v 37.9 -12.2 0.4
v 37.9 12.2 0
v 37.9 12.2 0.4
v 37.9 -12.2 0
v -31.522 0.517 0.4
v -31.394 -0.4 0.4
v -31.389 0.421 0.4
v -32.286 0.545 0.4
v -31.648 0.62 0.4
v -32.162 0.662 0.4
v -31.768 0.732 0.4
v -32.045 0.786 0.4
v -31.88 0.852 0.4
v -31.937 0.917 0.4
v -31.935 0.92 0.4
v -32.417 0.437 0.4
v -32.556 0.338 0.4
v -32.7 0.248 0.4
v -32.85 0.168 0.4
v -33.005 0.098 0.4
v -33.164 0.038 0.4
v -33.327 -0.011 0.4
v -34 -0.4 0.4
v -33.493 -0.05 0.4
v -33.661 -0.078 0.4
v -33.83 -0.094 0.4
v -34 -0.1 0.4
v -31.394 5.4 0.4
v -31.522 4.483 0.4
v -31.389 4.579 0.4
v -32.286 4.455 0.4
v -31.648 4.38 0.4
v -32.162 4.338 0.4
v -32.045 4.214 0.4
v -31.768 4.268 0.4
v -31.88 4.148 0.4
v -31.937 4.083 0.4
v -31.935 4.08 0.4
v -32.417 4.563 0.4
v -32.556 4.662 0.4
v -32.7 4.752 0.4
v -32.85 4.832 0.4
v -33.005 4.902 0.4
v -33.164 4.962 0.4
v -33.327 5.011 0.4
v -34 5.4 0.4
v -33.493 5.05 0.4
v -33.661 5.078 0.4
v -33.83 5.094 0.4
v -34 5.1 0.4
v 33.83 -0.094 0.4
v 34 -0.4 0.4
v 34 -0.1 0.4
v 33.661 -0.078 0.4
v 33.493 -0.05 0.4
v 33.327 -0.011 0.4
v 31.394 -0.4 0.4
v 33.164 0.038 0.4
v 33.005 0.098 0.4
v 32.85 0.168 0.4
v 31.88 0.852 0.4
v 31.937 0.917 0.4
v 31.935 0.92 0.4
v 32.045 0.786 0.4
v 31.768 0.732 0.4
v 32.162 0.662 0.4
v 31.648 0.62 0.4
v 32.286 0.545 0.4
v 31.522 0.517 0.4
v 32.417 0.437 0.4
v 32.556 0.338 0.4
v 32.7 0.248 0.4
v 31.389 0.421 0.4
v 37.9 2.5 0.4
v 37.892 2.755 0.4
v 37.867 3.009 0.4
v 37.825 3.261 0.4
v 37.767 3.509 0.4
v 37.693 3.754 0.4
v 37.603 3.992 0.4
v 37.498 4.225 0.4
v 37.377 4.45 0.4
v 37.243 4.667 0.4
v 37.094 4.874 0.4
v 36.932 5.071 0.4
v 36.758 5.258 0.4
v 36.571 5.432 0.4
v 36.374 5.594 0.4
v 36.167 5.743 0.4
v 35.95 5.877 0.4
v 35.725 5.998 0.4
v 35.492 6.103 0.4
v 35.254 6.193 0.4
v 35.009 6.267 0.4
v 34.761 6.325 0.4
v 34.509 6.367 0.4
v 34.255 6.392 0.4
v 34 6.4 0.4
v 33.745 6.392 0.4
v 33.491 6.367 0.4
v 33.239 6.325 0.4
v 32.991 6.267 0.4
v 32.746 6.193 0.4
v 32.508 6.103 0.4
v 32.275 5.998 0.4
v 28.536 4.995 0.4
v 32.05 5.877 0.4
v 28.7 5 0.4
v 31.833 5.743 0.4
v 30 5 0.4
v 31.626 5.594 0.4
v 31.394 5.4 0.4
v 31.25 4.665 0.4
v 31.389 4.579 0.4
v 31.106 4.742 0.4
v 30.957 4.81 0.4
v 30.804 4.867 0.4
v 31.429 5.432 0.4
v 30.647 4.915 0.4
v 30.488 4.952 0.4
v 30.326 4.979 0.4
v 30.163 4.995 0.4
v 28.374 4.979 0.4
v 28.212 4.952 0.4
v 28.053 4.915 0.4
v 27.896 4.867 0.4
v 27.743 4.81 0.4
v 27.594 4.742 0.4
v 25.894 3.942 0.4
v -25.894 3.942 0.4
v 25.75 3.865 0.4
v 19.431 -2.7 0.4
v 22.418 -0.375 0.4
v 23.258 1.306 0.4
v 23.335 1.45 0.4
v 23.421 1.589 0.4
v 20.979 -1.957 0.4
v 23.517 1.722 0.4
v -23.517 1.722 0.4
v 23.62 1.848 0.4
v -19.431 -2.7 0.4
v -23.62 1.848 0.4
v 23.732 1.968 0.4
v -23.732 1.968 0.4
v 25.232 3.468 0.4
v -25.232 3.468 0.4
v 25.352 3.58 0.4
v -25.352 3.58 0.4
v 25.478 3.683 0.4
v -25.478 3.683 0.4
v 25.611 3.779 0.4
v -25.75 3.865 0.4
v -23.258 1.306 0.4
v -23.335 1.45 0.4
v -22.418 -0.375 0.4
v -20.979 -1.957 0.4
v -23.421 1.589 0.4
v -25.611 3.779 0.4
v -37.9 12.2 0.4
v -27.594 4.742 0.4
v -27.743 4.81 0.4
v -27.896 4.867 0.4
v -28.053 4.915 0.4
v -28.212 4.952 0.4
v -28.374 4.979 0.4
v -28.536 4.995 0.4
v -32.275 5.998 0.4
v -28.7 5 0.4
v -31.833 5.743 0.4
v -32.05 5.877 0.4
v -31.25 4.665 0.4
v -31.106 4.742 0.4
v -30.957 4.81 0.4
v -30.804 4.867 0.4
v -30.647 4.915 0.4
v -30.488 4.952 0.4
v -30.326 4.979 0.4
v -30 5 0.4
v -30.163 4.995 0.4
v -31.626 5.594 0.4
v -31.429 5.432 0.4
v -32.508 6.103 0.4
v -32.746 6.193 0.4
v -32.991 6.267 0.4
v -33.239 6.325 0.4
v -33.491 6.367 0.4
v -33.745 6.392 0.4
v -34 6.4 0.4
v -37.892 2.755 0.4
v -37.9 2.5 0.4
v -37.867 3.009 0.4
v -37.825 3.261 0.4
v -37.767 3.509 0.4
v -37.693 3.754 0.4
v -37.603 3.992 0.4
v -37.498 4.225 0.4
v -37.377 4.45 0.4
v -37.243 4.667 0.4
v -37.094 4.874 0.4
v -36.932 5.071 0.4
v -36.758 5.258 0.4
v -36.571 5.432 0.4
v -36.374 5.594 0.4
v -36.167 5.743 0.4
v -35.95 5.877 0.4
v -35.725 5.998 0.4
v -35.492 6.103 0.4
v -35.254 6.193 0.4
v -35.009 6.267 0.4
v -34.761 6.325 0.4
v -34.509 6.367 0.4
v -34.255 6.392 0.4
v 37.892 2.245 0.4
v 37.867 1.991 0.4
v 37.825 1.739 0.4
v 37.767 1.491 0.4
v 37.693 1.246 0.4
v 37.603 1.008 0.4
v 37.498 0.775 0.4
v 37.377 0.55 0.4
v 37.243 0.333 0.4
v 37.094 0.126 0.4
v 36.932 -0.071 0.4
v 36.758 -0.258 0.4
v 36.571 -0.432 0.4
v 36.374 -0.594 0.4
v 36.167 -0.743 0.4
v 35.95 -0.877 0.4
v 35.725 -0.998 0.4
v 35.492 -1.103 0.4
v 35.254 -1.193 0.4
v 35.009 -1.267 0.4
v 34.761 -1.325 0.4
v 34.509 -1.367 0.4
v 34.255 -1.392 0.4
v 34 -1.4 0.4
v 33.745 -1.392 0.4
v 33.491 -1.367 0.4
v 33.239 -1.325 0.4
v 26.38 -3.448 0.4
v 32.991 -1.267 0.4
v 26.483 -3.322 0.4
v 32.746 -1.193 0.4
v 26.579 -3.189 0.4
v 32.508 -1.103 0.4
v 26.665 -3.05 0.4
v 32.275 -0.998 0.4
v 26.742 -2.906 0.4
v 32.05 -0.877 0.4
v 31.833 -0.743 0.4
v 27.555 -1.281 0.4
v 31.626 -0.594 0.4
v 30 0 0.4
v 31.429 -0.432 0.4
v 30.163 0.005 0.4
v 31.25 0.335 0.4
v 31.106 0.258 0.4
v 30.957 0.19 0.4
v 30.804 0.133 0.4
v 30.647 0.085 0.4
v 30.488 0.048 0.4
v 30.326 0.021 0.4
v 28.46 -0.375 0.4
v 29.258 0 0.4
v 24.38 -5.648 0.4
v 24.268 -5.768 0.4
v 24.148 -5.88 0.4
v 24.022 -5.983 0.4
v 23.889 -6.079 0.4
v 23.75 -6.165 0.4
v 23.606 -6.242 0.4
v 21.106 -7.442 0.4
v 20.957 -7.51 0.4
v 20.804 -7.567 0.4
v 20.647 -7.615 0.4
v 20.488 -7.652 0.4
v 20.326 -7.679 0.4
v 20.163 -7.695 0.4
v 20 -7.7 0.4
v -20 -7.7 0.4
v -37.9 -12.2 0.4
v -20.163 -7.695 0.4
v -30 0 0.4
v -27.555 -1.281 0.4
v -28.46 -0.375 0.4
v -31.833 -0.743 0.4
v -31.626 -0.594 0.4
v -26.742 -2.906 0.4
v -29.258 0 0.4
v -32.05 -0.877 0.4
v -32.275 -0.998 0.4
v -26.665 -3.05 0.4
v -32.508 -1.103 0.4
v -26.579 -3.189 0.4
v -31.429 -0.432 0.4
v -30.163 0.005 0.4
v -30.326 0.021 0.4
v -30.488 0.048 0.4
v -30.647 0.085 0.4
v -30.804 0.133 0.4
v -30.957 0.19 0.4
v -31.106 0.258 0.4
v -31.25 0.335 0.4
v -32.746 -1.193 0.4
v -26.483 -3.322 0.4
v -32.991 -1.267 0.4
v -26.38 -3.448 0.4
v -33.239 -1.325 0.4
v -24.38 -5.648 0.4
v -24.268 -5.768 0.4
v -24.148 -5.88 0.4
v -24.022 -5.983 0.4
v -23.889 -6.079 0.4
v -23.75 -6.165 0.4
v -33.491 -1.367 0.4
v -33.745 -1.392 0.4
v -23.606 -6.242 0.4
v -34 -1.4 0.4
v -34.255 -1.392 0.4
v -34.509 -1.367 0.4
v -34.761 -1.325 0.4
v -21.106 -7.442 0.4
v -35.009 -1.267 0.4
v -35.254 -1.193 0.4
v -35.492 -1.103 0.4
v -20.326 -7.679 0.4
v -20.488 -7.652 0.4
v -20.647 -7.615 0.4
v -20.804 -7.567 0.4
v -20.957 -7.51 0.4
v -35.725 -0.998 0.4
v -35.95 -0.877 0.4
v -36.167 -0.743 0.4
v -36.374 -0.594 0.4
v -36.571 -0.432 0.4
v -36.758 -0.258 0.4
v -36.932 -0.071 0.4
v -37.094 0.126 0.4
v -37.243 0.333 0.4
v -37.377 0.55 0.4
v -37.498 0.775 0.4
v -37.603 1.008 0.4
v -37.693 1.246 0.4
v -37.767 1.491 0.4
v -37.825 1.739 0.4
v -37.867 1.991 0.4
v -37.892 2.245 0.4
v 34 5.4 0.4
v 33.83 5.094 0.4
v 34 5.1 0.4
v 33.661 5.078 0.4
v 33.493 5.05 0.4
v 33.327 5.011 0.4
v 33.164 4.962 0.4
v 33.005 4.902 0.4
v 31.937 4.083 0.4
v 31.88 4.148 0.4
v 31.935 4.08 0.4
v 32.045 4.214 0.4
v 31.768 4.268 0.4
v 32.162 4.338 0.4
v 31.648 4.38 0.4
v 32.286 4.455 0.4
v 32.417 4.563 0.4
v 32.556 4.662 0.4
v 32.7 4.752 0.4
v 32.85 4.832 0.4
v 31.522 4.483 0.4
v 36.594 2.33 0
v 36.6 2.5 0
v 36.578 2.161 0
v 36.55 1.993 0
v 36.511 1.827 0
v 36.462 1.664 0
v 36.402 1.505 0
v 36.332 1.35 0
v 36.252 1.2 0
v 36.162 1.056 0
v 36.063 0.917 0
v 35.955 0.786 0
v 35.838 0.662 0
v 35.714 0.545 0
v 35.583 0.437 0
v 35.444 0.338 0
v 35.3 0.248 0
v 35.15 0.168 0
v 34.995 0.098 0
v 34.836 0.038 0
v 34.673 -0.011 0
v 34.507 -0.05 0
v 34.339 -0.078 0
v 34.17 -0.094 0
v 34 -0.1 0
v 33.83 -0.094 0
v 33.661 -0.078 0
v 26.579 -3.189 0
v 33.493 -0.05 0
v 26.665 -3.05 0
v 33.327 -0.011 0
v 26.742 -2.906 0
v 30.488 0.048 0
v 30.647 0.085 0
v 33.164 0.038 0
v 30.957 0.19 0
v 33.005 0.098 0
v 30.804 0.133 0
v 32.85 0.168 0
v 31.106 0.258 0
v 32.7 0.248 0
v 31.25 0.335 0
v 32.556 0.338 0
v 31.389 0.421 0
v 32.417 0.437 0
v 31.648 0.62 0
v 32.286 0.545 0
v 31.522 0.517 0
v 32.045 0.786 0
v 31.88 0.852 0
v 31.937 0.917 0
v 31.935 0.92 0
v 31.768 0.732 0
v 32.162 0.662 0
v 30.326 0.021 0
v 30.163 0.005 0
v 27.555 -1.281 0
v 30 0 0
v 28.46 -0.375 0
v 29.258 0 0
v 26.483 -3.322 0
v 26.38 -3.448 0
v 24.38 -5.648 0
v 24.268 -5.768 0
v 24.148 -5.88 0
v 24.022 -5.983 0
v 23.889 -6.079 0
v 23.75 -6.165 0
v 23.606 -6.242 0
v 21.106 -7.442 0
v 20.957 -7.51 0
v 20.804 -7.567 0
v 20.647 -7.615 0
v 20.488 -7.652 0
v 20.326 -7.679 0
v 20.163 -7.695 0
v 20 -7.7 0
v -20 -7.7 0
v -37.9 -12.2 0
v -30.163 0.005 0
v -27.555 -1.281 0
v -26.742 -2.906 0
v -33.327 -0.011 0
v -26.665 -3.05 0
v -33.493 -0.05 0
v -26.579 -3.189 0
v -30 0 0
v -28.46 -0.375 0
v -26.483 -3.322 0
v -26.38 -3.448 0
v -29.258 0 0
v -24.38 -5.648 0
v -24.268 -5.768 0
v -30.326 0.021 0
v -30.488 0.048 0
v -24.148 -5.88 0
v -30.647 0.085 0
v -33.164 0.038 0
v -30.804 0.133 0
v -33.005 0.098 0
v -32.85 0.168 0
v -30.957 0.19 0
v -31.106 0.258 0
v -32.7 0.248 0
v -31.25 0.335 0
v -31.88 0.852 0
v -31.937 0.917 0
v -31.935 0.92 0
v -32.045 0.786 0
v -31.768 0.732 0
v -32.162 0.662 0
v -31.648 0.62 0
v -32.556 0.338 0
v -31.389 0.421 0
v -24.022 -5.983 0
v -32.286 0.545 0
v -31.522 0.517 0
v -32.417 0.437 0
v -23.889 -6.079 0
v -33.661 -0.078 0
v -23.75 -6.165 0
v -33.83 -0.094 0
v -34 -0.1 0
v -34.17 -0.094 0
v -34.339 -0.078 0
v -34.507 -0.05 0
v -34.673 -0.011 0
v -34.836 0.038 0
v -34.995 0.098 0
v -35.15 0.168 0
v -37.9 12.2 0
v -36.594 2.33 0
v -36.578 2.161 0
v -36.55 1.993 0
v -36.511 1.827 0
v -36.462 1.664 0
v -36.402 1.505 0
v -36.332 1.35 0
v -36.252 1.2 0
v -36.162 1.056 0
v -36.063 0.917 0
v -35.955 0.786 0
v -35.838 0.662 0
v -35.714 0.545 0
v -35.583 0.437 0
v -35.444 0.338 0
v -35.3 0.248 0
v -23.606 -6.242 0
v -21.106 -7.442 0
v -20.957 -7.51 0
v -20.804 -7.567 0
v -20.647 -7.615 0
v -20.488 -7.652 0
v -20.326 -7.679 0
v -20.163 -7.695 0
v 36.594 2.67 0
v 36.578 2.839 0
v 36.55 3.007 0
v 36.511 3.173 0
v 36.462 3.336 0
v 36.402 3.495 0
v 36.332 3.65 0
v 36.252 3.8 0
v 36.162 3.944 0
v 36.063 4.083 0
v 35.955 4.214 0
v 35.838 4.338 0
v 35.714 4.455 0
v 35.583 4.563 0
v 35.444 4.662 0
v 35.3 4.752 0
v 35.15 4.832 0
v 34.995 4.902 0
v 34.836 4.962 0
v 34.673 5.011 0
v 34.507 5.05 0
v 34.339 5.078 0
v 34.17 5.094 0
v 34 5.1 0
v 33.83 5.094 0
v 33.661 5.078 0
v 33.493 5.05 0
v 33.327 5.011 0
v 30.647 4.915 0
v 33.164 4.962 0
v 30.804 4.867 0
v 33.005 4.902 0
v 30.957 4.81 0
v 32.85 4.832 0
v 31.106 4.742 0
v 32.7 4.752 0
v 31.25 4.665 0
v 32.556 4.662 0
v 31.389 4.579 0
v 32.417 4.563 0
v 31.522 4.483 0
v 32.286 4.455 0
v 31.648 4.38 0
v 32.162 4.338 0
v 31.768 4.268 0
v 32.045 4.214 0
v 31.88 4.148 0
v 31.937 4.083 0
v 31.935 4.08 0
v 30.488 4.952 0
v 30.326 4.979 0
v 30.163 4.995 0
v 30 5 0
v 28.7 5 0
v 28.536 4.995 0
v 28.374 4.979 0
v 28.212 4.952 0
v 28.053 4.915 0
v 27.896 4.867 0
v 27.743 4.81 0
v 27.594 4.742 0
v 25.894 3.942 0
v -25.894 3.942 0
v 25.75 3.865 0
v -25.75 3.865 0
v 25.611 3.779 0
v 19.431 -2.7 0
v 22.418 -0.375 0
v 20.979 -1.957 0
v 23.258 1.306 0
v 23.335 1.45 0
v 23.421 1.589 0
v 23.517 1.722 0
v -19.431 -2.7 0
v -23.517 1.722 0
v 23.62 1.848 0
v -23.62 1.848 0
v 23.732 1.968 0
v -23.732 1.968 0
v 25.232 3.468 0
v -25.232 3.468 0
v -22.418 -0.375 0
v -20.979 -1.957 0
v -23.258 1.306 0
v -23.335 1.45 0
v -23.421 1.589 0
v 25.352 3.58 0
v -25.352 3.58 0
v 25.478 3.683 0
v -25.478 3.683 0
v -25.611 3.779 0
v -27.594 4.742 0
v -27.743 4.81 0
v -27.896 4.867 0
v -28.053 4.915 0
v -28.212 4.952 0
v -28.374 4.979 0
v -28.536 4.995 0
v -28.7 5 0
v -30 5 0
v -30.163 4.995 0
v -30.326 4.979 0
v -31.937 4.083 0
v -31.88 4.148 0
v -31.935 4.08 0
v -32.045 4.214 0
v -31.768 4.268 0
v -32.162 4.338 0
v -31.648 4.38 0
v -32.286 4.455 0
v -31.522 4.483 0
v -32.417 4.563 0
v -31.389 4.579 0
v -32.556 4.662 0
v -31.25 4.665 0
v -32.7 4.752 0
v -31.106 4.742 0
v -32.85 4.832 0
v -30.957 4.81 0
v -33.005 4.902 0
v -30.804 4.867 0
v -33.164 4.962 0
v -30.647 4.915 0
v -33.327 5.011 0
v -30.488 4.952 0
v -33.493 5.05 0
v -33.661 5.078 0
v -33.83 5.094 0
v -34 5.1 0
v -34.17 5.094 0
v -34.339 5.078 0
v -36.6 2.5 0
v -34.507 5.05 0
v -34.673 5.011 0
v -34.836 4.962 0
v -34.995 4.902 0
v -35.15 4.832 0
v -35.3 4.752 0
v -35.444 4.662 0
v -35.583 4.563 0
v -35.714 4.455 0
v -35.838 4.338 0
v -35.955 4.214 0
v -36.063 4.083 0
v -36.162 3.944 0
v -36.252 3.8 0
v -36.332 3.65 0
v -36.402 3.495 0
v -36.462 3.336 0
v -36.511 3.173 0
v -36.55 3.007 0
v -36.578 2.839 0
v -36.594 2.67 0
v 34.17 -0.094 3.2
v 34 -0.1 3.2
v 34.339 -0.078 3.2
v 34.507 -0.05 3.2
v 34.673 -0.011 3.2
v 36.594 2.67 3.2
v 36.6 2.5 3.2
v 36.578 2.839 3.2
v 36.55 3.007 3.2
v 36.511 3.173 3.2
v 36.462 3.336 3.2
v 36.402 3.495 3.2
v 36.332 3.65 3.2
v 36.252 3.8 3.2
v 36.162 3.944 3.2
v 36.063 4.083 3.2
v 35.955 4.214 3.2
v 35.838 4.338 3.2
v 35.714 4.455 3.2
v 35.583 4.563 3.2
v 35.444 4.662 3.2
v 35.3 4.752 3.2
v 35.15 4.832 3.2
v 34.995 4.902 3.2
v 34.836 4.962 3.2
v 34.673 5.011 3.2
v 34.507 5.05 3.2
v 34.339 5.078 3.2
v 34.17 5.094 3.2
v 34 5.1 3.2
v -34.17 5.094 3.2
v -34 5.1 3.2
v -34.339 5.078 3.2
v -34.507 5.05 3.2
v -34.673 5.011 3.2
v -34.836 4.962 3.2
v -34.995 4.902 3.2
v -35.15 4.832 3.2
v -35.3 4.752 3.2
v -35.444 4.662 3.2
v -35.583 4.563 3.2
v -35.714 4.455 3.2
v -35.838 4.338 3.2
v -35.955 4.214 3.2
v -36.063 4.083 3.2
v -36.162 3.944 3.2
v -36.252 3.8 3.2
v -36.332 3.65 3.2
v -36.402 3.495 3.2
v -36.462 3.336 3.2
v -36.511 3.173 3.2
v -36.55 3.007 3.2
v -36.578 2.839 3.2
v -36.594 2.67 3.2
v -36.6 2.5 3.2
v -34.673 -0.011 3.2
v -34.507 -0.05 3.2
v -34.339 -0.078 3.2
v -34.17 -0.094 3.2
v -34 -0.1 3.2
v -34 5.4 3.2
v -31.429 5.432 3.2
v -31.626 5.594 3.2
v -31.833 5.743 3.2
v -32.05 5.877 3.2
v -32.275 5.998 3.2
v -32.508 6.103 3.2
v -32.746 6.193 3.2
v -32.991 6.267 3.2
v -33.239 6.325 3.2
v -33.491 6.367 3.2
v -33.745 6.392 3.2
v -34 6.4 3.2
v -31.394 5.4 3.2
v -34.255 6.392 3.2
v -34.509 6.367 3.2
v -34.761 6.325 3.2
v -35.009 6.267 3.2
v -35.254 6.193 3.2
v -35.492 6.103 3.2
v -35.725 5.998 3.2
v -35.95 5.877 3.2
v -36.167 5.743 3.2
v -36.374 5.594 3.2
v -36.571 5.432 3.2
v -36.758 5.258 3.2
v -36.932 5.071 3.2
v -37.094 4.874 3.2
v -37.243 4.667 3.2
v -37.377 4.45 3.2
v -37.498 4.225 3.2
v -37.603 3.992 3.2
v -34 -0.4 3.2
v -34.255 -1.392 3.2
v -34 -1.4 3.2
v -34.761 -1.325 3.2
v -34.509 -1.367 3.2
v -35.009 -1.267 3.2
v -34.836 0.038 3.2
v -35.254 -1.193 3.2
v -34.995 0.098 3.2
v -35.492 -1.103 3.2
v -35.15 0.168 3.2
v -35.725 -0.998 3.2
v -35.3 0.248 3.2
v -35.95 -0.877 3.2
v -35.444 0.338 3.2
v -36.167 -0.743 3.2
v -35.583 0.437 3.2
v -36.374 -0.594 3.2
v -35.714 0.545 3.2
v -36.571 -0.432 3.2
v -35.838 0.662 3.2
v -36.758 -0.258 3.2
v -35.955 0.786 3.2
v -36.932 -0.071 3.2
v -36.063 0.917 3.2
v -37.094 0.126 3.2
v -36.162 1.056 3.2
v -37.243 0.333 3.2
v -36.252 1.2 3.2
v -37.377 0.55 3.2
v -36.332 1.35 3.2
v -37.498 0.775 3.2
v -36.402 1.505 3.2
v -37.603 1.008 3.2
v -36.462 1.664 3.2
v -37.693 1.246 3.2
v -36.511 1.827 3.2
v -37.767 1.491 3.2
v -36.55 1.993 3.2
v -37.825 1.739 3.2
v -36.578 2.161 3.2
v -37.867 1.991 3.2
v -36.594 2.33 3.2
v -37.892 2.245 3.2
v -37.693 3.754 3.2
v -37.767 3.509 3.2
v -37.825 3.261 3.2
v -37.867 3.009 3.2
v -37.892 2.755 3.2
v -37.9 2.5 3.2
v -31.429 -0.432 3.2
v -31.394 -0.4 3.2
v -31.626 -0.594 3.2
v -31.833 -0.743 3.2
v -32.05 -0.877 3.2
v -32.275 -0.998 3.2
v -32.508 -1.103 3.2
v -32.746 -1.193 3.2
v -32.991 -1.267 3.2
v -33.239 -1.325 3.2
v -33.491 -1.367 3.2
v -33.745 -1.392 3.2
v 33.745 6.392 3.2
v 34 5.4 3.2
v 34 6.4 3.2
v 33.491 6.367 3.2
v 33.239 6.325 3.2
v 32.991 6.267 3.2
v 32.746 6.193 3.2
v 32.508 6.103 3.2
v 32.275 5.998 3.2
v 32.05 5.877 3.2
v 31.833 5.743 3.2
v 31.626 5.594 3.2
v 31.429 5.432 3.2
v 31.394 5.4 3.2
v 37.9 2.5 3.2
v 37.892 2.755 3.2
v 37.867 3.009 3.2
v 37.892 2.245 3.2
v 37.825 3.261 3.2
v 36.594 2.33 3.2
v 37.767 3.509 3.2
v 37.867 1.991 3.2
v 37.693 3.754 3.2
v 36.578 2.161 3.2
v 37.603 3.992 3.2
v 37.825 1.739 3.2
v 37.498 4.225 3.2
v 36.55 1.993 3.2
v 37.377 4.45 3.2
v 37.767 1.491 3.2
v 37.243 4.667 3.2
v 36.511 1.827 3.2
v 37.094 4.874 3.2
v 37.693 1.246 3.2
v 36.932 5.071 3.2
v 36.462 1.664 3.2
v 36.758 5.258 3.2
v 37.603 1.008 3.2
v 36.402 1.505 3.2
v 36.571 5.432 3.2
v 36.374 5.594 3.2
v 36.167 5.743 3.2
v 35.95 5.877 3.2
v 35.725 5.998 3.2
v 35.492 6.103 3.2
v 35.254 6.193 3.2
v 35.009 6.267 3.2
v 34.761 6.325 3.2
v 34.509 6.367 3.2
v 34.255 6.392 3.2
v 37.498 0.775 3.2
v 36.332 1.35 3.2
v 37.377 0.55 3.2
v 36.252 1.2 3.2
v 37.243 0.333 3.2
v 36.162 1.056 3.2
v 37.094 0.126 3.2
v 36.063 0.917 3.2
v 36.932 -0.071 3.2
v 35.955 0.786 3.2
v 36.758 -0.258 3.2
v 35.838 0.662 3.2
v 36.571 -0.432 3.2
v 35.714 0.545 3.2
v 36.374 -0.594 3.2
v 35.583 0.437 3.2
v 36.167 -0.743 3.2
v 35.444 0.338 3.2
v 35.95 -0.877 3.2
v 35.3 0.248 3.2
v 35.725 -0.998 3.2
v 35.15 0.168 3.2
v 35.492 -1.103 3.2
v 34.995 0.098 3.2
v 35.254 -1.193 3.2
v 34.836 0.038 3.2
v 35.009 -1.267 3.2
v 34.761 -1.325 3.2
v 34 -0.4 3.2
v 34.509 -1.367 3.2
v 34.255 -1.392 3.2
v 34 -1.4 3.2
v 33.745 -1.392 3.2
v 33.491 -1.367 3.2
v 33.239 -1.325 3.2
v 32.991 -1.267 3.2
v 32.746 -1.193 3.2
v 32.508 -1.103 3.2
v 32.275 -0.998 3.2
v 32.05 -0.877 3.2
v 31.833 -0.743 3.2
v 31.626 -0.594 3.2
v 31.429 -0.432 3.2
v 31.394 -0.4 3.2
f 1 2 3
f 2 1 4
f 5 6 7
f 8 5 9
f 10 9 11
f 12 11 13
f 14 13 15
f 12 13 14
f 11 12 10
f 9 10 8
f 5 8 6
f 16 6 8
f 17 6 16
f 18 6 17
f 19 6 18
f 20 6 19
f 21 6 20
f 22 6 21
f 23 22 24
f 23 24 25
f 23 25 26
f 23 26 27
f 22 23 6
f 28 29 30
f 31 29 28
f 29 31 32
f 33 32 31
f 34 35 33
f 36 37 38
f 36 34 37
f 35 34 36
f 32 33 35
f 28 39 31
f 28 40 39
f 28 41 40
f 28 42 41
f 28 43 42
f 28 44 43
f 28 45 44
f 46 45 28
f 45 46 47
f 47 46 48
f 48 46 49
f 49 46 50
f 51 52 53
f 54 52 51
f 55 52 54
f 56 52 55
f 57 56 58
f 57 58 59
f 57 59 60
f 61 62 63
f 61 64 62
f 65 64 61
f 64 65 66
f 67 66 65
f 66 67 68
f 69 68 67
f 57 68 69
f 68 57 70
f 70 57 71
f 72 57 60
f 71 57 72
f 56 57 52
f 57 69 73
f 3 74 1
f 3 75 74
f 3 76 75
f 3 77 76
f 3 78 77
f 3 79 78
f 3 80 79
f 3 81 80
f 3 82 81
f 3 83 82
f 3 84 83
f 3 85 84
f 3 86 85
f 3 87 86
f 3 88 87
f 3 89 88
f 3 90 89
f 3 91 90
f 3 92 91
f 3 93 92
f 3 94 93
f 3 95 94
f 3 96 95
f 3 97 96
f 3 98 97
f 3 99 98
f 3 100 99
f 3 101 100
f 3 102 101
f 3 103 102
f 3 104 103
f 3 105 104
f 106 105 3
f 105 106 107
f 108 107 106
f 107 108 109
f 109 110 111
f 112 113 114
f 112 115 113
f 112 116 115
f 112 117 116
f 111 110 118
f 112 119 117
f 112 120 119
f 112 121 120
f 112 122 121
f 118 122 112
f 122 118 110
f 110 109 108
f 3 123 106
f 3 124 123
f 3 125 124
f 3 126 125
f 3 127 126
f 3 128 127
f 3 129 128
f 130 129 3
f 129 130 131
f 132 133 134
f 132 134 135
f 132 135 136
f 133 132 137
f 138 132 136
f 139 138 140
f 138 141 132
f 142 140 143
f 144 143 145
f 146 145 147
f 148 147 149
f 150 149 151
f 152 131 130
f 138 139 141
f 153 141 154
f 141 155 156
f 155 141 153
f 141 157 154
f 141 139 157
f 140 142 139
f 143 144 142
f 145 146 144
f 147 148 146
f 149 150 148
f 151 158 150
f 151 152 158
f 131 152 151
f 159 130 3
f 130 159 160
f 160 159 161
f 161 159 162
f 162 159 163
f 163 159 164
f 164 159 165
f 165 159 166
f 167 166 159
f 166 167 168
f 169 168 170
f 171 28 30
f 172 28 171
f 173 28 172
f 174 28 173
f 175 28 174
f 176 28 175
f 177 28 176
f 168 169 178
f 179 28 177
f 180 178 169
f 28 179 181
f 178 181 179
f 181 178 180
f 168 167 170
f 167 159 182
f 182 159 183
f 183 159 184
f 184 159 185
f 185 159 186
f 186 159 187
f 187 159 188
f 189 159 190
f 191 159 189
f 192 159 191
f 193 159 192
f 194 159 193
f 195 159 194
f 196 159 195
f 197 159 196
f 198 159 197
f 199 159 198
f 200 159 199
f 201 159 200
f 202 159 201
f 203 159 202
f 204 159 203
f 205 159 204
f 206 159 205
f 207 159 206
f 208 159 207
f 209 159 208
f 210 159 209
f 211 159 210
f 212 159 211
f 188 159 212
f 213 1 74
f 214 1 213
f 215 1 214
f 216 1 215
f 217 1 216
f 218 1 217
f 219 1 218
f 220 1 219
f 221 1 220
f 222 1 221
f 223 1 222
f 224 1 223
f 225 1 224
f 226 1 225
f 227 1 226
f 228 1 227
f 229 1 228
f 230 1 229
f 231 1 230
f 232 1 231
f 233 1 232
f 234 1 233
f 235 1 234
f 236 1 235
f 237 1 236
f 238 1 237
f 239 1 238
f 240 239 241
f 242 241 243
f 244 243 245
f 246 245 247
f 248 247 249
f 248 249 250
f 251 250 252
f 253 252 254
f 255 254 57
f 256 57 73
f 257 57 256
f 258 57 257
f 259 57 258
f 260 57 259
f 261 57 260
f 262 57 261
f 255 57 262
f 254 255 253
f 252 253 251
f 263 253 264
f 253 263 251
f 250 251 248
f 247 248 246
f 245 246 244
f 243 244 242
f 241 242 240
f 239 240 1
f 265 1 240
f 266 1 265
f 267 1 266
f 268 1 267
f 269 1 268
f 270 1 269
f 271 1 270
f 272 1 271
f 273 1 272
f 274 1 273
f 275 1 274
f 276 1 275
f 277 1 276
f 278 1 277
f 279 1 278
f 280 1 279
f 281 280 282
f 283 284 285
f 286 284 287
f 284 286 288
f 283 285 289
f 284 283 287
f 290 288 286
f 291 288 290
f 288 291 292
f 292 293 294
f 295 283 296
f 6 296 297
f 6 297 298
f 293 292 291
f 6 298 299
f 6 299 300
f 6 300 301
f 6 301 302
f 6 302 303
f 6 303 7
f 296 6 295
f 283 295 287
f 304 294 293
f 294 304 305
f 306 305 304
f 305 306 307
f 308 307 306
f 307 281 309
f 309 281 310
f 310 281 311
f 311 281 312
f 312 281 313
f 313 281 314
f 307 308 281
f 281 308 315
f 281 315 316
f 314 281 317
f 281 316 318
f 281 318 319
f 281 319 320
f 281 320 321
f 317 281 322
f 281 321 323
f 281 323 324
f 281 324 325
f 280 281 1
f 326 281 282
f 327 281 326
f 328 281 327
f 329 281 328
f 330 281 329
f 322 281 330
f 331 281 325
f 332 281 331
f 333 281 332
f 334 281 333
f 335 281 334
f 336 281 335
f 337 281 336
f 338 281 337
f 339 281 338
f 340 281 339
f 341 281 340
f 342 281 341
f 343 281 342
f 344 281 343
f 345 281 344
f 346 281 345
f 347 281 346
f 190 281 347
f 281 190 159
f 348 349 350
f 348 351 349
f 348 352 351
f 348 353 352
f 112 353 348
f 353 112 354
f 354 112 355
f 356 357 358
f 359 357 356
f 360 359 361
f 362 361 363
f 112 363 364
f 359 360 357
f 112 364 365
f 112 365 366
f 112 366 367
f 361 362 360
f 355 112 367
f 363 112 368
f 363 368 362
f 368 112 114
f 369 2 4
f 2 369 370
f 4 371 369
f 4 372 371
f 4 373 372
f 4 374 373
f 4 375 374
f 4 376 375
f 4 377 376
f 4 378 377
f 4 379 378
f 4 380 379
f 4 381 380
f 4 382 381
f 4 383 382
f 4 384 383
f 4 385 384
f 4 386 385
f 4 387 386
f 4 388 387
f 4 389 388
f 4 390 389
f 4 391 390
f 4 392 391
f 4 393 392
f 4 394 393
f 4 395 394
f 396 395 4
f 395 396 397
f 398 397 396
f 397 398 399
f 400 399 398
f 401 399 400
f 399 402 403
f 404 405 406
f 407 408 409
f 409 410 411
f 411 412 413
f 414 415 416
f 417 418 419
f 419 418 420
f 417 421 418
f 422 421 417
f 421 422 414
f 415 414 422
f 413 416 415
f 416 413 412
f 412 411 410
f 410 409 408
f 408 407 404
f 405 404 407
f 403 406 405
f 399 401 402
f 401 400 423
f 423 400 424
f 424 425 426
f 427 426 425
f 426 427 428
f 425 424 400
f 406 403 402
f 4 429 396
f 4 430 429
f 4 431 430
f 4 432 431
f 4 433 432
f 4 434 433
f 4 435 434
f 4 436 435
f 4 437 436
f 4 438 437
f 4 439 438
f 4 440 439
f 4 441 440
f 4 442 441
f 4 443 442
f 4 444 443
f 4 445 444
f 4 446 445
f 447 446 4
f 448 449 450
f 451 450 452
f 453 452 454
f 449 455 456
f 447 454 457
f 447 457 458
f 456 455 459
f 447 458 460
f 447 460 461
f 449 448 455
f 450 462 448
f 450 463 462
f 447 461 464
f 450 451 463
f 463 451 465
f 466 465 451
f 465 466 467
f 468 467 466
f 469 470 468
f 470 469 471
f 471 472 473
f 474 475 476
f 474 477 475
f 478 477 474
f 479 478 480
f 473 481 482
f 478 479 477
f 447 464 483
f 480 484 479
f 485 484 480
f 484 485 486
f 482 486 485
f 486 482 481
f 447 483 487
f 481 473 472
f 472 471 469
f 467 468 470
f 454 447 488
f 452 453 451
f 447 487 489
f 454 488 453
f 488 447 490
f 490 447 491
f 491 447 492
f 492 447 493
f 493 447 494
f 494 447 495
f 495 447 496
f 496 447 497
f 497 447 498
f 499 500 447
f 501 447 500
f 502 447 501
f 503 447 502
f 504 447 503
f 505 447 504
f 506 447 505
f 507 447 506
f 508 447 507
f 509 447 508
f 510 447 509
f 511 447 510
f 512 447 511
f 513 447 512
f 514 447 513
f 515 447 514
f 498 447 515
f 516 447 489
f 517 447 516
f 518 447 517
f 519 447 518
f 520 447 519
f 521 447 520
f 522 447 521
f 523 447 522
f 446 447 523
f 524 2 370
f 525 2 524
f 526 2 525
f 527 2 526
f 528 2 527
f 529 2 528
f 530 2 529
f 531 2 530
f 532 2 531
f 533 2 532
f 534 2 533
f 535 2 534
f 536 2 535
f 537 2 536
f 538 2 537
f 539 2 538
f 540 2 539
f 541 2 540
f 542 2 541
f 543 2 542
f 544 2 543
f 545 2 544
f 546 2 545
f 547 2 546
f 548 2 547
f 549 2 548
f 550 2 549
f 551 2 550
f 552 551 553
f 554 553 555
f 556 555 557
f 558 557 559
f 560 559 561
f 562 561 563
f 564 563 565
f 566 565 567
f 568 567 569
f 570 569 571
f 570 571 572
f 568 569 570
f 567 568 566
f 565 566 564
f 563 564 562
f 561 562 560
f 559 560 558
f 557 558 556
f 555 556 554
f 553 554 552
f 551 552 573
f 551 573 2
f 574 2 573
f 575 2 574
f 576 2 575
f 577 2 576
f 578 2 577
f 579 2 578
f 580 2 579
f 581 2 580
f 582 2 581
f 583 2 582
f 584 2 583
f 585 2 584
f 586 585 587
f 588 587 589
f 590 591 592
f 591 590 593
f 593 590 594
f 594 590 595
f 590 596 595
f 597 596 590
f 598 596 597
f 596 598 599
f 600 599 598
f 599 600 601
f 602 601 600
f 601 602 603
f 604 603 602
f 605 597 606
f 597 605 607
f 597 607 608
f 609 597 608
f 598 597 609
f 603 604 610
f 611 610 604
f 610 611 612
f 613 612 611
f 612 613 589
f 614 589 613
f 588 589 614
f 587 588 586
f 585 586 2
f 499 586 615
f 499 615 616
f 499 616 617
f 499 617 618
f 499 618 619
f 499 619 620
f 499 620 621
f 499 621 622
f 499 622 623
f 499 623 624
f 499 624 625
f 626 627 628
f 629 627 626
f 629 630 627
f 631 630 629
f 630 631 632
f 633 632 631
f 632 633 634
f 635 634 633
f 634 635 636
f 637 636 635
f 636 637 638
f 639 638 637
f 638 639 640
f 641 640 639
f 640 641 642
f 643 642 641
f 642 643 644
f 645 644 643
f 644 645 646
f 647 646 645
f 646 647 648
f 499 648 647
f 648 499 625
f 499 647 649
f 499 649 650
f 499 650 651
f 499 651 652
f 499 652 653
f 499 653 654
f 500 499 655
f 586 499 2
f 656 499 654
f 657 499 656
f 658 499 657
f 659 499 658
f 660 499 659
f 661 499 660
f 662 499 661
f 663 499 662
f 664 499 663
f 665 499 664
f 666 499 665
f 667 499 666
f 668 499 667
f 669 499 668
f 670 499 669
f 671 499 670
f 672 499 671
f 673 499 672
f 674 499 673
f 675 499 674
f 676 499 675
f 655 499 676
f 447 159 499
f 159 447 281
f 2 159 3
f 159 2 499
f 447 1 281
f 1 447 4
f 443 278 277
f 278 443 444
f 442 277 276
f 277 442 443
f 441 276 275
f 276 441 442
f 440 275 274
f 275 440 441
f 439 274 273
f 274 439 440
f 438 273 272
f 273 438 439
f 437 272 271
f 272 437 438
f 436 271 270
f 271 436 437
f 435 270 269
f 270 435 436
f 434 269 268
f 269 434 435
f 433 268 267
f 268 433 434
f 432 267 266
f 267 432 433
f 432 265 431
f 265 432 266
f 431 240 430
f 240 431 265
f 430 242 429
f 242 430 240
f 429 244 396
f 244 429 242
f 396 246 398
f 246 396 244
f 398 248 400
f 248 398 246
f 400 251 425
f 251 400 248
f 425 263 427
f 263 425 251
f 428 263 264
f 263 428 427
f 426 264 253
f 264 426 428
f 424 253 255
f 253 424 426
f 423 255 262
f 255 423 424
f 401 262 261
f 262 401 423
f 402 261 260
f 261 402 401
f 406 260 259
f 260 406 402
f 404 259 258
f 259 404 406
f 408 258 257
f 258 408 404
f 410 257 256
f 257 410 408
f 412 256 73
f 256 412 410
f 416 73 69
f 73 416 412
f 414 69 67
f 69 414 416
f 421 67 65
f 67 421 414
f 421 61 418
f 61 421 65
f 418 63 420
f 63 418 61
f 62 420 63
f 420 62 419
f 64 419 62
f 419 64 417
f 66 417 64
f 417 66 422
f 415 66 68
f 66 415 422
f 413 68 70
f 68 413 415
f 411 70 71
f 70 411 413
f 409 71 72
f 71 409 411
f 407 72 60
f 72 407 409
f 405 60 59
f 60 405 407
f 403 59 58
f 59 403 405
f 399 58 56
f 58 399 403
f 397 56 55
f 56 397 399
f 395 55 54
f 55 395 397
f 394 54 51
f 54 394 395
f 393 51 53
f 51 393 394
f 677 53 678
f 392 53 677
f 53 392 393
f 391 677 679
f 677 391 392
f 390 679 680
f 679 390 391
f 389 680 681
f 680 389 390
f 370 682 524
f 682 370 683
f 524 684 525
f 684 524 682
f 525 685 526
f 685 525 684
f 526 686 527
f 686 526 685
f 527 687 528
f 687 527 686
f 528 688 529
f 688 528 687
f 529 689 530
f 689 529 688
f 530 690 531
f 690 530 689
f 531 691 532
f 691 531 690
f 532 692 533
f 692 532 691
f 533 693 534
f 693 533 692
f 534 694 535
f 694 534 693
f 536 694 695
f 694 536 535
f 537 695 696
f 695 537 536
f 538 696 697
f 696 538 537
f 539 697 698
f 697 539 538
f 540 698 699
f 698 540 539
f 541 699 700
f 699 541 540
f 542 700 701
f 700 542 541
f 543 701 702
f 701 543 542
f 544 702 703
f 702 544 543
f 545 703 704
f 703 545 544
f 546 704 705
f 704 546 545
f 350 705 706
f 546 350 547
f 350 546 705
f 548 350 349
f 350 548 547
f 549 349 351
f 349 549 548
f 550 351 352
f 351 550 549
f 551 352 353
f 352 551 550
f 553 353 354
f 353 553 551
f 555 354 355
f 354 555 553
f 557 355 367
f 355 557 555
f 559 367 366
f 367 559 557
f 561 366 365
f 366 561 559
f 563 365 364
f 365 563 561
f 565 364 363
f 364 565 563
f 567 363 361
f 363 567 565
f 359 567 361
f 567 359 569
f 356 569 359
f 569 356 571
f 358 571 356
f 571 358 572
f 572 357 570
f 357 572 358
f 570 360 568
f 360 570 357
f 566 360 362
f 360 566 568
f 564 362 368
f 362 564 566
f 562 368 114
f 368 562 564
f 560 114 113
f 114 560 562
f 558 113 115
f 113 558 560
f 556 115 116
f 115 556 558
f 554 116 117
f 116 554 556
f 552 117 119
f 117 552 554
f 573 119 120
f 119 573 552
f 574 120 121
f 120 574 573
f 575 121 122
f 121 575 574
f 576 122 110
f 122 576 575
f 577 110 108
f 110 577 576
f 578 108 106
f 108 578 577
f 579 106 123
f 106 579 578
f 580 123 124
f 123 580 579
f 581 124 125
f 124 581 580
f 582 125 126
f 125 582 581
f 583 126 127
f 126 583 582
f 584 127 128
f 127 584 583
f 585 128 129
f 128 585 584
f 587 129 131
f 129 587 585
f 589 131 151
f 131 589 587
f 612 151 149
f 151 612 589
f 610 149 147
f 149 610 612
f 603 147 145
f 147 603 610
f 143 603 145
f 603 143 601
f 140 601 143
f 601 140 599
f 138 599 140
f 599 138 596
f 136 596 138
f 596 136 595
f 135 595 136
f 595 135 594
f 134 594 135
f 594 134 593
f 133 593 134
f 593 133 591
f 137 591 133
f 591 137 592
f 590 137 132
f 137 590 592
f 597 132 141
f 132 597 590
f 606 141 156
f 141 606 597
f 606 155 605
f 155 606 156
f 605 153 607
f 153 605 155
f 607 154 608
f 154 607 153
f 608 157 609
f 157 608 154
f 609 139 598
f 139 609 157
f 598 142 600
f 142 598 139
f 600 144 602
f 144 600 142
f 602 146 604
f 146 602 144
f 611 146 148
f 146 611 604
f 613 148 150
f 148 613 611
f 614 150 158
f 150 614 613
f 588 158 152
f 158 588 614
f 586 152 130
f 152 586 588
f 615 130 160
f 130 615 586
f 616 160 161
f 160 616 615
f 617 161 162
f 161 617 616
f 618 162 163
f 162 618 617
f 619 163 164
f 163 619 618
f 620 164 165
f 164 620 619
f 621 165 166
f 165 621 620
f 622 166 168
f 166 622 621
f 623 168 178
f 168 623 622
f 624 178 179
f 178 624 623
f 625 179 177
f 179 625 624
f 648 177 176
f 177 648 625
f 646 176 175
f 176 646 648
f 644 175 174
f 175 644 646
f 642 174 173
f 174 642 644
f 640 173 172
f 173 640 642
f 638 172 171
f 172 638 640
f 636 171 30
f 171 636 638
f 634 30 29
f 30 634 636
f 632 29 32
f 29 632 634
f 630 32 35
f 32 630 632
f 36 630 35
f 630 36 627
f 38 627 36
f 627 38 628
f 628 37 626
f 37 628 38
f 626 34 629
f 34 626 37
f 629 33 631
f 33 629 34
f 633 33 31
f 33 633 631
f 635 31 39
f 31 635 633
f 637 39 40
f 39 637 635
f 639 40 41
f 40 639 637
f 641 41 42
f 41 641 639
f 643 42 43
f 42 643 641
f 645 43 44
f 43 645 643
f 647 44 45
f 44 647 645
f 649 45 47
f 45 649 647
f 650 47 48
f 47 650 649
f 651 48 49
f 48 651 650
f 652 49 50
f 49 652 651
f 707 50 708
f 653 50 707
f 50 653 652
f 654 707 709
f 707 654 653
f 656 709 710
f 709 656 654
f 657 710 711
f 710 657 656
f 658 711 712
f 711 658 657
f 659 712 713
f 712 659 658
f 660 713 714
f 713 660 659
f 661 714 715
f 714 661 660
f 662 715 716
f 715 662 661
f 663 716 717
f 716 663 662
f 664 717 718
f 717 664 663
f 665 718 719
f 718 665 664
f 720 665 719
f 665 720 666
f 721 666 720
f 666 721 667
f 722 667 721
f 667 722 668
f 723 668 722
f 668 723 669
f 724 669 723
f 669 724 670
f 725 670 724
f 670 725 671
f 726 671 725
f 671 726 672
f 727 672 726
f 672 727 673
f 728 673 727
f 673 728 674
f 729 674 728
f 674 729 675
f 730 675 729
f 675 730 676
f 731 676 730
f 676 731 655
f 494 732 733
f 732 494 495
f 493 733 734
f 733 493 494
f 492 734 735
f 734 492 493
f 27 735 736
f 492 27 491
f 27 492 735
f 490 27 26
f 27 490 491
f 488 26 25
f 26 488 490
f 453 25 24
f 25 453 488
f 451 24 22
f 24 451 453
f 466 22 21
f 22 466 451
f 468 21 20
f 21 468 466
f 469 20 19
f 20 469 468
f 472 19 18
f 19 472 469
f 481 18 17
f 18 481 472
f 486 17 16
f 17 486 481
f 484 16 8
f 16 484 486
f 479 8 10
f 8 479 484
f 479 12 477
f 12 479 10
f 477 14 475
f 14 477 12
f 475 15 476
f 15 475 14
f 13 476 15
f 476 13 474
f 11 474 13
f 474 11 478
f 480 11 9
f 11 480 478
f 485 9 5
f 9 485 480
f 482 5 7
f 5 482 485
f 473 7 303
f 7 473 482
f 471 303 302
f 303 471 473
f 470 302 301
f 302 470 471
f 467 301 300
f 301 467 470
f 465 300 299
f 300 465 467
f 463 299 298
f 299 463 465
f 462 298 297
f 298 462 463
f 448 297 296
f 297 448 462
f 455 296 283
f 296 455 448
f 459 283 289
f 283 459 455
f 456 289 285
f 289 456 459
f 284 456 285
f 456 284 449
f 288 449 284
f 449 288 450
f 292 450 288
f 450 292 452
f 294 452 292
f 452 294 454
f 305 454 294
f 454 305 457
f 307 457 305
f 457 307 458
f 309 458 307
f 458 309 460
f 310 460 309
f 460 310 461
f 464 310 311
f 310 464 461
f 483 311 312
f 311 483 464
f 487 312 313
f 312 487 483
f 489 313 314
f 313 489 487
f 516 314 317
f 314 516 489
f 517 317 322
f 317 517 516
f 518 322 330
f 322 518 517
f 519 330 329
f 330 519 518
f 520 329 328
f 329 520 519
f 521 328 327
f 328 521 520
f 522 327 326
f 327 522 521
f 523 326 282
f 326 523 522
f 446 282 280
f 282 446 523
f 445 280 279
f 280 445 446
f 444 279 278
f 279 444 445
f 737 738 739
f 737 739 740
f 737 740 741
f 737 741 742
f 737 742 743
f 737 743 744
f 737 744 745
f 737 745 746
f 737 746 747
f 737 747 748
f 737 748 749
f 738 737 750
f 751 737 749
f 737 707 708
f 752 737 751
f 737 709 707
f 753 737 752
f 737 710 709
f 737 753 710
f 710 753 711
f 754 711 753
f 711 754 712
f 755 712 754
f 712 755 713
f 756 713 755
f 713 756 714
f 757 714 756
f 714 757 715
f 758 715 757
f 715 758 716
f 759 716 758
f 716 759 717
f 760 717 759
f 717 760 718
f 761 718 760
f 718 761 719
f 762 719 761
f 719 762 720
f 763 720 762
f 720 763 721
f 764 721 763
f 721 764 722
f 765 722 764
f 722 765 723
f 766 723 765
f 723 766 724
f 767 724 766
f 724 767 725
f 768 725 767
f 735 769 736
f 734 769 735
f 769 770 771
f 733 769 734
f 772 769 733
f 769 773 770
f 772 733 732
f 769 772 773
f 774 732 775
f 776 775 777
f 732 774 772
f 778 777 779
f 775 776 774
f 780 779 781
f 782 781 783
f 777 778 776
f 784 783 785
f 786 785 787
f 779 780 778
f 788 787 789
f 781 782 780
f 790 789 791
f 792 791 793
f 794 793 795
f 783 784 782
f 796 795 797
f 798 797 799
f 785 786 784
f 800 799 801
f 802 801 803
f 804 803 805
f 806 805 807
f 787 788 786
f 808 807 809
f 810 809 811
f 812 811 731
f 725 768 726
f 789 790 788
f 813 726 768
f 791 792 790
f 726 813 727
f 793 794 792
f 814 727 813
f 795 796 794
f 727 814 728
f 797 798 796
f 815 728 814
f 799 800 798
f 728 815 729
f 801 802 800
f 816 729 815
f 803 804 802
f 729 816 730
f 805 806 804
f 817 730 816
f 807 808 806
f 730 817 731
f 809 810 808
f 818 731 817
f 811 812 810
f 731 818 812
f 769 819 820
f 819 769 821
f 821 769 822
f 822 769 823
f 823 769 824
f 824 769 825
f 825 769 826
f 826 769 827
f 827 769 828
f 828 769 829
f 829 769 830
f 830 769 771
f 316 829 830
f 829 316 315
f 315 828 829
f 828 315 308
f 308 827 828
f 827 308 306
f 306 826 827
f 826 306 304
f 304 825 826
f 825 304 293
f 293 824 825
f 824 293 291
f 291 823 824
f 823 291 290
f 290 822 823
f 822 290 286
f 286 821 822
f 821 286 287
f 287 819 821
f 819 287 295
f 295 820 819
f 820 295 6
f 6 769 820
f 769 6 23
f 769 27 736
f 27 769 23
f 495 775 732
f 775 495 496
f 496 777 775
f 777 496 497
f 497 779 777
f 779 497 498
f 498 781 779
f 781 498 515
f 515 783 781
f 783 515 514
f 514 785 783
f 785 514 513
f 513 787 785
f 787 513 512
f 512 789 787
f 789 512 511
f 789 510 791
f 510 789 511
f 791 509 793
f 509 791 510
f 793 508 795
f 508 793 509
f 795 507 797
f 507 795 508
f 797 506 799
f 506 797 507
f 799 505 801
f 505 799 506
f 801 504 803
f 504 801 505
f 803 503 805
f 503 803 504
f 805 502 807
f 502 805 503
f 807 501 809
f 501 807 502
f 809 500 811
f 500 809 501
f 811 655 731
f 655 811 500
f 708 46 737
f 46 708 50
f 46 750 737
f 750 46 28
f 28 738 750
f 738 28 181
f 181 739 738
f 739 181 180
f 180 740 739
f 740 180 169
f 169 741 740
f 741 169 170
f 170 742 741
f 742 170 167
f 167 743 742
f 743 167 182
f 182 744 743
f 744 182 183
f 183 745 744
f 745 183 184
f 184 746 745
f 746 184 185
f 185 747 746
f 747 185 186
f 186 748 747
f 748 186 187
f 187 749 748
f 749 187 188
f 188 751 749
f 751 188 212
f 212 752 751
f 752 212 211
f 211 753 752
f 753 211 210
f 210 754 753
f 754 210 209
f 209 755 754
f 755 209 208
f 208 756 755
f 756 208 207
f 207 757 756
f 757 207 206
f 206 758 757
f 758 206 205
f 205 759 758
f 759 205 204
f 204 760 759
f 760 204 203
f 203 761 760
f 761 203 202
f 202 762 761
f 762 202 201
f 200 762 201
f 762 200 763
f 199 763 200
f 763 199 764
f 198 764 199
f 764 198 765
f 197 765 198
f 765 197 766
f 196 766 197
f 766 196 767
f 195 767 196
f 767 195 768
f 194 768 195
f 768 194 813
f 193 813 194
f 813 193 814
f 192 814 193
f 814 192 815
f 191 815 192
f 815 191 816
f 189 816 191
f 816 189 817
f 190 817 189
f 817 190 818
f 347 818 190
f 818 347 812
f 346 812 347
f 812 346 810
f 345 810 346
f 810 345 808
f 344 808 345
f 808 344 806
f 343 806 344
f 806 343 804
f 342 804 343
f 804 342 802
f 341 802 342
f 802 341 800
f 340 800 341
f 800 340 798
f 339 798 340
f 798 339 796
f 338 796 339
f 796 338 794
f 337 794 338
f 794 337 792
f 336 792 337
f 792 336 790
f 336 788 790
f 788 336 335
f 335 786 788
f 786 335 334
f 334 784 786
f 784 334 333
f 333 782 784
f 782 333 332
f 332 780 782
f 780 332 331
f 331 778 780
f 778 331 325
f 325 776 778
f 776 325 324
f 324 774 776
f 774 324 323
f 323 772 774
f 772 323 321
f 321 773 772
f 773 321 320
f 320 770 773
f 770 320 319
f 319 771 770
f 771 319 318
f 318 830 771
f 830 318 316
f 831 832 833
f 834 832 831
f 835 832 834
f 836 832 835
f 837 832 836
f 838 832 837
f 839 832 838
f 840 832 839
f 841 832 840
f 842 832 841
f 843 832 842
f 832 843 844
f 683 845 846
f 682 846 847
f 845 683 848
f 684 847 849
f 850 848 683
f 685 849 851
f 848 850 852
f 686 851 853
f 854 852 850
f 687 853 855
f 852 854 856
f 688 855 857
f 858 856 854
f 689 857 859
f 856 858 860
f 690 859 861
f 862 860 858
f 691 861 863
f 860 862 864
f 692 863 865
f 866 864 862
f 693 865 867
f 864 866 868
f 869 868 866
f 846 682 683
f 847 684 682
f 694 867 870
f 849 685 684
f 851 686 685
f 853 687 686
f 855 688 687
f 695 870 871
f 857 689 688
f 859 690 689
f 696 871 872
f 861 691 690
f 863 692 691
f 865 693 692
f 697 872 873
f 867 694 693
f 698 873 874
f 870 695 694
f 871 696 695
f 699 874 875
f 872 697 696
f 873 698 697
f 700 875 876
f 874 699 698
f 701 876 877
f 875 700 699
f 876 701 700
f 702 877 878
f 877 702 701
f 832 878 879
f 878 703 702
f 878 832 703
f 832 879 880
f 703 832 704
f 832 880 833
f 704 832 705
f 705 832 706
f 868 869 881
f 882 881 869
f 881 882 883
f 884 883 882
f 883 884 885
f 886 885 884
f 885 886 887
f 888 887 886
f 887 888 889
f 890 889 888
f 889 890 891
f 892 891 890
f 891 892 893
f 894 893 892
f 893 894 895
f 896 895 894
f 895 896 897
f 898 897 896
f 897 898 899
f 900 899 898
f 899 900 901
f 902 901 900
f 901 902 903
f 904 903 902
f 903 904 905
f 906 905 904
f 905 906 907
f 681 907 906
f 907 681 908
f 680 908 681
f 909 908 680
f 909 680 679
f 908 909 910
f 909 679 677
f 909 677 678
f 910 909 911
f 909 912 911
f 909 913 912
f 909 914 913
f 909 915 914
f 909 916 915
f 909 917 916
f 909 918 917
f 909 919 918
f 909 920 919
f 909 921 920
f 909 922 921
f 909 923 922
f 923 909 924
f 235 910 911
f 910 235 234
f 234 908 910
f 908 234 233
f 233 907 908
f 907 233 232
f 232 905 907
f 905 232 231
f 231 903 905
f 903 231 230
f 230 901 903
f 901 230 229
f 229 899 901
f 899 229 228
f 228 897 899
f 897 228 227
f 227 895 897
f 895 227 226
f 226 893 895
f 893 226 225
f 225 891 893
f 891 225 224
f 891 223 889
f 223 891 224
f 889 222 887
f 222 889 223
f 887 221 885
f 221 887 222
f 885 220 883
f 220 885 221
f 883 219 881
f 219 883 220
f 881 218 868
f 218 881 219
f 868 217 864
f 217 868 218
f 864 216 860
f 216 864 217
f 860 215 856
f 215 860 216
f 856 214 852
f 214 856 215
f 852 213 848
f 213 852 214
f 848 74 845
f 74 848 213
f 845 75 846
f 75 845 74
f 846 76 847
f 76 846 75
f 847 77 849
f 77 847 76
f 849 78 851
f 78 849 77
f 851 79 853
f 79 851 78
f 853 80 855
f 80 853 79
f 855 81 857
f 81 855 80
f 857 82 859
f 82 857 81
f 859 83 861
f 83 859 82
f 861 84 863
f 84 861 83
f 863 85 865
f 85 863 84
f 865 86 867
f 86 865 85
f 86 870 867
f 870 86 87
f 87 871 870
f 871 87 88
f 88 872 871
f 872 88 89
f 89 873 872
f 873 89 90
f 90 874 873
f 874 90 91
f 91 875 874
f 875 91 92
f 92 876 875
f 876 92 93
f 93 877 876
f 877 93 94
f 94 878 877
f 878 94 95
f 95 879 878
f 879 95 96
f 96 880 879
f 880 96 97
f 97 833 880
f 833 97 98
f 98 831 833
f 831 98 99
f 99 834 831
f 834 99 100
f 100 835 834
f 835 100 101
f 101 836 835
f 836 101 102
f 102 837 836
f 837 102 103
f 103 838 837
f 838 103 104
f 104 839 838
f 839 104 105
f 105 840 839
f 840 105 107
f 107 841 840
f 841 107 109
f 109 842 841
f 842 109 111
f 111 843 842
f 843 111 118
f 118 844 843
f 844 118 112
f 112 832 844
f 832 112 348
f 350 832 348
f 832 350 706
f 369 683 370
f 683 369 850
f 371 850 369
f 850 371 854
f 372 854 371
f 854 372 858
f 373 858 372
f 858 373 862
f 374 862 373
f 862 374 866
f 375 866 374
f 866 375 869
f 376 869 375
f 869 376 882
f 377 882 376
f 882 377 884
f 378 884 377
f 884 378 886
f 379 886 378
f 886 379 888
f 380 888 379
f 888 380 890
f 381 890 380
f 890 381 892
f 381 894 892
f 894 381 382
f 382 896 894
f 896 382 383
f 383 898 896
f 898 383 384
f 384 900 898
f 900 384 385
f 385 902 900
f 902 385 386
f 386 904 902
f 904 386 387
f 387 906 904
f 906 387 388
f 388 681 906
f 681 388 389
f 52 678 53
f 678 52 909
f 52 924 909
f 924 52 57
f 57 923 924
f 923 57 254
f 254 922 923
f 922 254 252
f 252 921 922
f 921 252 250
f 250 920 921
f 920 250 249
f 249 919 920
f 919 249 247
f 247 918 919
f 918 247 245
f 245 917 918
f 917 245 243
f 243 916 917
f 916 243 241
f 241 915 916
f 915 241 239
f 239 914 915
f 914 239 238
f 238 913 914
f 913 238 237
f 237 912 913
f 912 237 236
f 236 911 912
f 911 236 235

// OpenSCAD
// U-Slide TPU gasket for a conventional upright microscope.
// The sample path is U-shaped in plan view: wells toward +Y, low viewing run toward -Y.
// Units: mm. Export STL/3MF with OpenSCAD; Creality Print accepts either format.
$fn = 96;

// User's stock glass dimensions
slide_l = 76.2;
slide_w = 25.4;
cover_l = 60.0;
cover_w = 24.0;

// One-piece TPU gasket. The glass slide closes the underside of the cutout;
// the coverslip closes the central U-channel from above.
base_l = 75.8;
base_w = 24.4;
base_t = 0.40;             // through-cut channel height
channel_w = 5.0;
well_id = 5.2;
well_od = 7.8;
well_height = 3.2;         // total height from print bed
well_x = 34.0;
well_y = 2.5;
well_gap = 5.8;             // collar opening faces inward toward the U-channel

// U centerline ends at the coverslip edge; the channel width overlaps both wells.
path_pts = [
    [-30.0, 2.5], [-28.7, 2.5], [-27.0, 1.7], [-25.5, 0.2],
    [-24.5,-1.8], [-22.5,-4.0], [-20.0,-5.2], [20.0,-5.2],
    [22.5,-4.0], [24.5,-1.8], [25.5,0.2], [27.0,1.7],
    [28.7,2.5], [30.0,2.5]
];

// Output modes: "print" for manufacture; "preview" for the glass assembly; "plan" for path inspection.
view_mode = "print";

module stroke_2d(points, width) {
    union() {
        for (i = [0 : len(points)-2])
            hull() {
                translate(points[i]) circle(d=width);
                translate(points[i+1]) circle(d=width);
            }
    }
}

module fluid_void_2d() {
    union() {
        stroke_2d(path_pts, channel_w);
        translate([-well_x,well_y]) circle(d=well_id);
        translate([ well_x,well_y]) circle(d=well_id);
    }
}

module base_gasket() {
    // Broad, thin layer supports the coverslip. The connected fluid path is cut through it.
    difference() {
        translate([0,0,base_t/2]) cube([base_l,base_w,base_t], center=true);
        translate([0,0,-0.01]) linear_extrude(height=base_t+0.02) fluid_void_2d();
    }
}

module c_collar_local(cx) {
    outer_r = well_od/2;
    inner_r = well_id/2;
    difference() {
        difference() {
            circle(r=outer_r);
            circle(r=inner_r);
        }
        // Remove the inward-facing arc to keep the well fully open to the channel.
        translate([cx < 0 ? outer_r : -outer_r, 0])
            square([2*outer_r, well_gap], center=true);
    }
}

module raised_reservoirs() {
    for (cx = [-well_x, well_x])
        translate([cx,well_y,0])
            linear_extrude(height=well_height)
                c_collar_local(cx);
}

module one_piece_insert() {
    union() {
        base_gasket();
        raised_reservoirs();
    }
}

if (view_mode == "print") {
    one_piece_insert();
} else if (view_mode == "plan") {
    projection(cut=true) one_piece_insert();
} else {
    // Preview only: slide below the gasket, central coverslip seated on the thin layer.
    color([0.55,0.57,0.60,0.7])
        translate([0,0,-0.45]) cube([slide_l,slide_w,0.9],center=true);
    color([0.88,0.92,0.95,0.5])
        translate([0,0,base_t+0.09]) cube([cover_l,cover_w,0.18],center=true);
    color([0.9,0.25,0.2]) one_piece_insert();
}
